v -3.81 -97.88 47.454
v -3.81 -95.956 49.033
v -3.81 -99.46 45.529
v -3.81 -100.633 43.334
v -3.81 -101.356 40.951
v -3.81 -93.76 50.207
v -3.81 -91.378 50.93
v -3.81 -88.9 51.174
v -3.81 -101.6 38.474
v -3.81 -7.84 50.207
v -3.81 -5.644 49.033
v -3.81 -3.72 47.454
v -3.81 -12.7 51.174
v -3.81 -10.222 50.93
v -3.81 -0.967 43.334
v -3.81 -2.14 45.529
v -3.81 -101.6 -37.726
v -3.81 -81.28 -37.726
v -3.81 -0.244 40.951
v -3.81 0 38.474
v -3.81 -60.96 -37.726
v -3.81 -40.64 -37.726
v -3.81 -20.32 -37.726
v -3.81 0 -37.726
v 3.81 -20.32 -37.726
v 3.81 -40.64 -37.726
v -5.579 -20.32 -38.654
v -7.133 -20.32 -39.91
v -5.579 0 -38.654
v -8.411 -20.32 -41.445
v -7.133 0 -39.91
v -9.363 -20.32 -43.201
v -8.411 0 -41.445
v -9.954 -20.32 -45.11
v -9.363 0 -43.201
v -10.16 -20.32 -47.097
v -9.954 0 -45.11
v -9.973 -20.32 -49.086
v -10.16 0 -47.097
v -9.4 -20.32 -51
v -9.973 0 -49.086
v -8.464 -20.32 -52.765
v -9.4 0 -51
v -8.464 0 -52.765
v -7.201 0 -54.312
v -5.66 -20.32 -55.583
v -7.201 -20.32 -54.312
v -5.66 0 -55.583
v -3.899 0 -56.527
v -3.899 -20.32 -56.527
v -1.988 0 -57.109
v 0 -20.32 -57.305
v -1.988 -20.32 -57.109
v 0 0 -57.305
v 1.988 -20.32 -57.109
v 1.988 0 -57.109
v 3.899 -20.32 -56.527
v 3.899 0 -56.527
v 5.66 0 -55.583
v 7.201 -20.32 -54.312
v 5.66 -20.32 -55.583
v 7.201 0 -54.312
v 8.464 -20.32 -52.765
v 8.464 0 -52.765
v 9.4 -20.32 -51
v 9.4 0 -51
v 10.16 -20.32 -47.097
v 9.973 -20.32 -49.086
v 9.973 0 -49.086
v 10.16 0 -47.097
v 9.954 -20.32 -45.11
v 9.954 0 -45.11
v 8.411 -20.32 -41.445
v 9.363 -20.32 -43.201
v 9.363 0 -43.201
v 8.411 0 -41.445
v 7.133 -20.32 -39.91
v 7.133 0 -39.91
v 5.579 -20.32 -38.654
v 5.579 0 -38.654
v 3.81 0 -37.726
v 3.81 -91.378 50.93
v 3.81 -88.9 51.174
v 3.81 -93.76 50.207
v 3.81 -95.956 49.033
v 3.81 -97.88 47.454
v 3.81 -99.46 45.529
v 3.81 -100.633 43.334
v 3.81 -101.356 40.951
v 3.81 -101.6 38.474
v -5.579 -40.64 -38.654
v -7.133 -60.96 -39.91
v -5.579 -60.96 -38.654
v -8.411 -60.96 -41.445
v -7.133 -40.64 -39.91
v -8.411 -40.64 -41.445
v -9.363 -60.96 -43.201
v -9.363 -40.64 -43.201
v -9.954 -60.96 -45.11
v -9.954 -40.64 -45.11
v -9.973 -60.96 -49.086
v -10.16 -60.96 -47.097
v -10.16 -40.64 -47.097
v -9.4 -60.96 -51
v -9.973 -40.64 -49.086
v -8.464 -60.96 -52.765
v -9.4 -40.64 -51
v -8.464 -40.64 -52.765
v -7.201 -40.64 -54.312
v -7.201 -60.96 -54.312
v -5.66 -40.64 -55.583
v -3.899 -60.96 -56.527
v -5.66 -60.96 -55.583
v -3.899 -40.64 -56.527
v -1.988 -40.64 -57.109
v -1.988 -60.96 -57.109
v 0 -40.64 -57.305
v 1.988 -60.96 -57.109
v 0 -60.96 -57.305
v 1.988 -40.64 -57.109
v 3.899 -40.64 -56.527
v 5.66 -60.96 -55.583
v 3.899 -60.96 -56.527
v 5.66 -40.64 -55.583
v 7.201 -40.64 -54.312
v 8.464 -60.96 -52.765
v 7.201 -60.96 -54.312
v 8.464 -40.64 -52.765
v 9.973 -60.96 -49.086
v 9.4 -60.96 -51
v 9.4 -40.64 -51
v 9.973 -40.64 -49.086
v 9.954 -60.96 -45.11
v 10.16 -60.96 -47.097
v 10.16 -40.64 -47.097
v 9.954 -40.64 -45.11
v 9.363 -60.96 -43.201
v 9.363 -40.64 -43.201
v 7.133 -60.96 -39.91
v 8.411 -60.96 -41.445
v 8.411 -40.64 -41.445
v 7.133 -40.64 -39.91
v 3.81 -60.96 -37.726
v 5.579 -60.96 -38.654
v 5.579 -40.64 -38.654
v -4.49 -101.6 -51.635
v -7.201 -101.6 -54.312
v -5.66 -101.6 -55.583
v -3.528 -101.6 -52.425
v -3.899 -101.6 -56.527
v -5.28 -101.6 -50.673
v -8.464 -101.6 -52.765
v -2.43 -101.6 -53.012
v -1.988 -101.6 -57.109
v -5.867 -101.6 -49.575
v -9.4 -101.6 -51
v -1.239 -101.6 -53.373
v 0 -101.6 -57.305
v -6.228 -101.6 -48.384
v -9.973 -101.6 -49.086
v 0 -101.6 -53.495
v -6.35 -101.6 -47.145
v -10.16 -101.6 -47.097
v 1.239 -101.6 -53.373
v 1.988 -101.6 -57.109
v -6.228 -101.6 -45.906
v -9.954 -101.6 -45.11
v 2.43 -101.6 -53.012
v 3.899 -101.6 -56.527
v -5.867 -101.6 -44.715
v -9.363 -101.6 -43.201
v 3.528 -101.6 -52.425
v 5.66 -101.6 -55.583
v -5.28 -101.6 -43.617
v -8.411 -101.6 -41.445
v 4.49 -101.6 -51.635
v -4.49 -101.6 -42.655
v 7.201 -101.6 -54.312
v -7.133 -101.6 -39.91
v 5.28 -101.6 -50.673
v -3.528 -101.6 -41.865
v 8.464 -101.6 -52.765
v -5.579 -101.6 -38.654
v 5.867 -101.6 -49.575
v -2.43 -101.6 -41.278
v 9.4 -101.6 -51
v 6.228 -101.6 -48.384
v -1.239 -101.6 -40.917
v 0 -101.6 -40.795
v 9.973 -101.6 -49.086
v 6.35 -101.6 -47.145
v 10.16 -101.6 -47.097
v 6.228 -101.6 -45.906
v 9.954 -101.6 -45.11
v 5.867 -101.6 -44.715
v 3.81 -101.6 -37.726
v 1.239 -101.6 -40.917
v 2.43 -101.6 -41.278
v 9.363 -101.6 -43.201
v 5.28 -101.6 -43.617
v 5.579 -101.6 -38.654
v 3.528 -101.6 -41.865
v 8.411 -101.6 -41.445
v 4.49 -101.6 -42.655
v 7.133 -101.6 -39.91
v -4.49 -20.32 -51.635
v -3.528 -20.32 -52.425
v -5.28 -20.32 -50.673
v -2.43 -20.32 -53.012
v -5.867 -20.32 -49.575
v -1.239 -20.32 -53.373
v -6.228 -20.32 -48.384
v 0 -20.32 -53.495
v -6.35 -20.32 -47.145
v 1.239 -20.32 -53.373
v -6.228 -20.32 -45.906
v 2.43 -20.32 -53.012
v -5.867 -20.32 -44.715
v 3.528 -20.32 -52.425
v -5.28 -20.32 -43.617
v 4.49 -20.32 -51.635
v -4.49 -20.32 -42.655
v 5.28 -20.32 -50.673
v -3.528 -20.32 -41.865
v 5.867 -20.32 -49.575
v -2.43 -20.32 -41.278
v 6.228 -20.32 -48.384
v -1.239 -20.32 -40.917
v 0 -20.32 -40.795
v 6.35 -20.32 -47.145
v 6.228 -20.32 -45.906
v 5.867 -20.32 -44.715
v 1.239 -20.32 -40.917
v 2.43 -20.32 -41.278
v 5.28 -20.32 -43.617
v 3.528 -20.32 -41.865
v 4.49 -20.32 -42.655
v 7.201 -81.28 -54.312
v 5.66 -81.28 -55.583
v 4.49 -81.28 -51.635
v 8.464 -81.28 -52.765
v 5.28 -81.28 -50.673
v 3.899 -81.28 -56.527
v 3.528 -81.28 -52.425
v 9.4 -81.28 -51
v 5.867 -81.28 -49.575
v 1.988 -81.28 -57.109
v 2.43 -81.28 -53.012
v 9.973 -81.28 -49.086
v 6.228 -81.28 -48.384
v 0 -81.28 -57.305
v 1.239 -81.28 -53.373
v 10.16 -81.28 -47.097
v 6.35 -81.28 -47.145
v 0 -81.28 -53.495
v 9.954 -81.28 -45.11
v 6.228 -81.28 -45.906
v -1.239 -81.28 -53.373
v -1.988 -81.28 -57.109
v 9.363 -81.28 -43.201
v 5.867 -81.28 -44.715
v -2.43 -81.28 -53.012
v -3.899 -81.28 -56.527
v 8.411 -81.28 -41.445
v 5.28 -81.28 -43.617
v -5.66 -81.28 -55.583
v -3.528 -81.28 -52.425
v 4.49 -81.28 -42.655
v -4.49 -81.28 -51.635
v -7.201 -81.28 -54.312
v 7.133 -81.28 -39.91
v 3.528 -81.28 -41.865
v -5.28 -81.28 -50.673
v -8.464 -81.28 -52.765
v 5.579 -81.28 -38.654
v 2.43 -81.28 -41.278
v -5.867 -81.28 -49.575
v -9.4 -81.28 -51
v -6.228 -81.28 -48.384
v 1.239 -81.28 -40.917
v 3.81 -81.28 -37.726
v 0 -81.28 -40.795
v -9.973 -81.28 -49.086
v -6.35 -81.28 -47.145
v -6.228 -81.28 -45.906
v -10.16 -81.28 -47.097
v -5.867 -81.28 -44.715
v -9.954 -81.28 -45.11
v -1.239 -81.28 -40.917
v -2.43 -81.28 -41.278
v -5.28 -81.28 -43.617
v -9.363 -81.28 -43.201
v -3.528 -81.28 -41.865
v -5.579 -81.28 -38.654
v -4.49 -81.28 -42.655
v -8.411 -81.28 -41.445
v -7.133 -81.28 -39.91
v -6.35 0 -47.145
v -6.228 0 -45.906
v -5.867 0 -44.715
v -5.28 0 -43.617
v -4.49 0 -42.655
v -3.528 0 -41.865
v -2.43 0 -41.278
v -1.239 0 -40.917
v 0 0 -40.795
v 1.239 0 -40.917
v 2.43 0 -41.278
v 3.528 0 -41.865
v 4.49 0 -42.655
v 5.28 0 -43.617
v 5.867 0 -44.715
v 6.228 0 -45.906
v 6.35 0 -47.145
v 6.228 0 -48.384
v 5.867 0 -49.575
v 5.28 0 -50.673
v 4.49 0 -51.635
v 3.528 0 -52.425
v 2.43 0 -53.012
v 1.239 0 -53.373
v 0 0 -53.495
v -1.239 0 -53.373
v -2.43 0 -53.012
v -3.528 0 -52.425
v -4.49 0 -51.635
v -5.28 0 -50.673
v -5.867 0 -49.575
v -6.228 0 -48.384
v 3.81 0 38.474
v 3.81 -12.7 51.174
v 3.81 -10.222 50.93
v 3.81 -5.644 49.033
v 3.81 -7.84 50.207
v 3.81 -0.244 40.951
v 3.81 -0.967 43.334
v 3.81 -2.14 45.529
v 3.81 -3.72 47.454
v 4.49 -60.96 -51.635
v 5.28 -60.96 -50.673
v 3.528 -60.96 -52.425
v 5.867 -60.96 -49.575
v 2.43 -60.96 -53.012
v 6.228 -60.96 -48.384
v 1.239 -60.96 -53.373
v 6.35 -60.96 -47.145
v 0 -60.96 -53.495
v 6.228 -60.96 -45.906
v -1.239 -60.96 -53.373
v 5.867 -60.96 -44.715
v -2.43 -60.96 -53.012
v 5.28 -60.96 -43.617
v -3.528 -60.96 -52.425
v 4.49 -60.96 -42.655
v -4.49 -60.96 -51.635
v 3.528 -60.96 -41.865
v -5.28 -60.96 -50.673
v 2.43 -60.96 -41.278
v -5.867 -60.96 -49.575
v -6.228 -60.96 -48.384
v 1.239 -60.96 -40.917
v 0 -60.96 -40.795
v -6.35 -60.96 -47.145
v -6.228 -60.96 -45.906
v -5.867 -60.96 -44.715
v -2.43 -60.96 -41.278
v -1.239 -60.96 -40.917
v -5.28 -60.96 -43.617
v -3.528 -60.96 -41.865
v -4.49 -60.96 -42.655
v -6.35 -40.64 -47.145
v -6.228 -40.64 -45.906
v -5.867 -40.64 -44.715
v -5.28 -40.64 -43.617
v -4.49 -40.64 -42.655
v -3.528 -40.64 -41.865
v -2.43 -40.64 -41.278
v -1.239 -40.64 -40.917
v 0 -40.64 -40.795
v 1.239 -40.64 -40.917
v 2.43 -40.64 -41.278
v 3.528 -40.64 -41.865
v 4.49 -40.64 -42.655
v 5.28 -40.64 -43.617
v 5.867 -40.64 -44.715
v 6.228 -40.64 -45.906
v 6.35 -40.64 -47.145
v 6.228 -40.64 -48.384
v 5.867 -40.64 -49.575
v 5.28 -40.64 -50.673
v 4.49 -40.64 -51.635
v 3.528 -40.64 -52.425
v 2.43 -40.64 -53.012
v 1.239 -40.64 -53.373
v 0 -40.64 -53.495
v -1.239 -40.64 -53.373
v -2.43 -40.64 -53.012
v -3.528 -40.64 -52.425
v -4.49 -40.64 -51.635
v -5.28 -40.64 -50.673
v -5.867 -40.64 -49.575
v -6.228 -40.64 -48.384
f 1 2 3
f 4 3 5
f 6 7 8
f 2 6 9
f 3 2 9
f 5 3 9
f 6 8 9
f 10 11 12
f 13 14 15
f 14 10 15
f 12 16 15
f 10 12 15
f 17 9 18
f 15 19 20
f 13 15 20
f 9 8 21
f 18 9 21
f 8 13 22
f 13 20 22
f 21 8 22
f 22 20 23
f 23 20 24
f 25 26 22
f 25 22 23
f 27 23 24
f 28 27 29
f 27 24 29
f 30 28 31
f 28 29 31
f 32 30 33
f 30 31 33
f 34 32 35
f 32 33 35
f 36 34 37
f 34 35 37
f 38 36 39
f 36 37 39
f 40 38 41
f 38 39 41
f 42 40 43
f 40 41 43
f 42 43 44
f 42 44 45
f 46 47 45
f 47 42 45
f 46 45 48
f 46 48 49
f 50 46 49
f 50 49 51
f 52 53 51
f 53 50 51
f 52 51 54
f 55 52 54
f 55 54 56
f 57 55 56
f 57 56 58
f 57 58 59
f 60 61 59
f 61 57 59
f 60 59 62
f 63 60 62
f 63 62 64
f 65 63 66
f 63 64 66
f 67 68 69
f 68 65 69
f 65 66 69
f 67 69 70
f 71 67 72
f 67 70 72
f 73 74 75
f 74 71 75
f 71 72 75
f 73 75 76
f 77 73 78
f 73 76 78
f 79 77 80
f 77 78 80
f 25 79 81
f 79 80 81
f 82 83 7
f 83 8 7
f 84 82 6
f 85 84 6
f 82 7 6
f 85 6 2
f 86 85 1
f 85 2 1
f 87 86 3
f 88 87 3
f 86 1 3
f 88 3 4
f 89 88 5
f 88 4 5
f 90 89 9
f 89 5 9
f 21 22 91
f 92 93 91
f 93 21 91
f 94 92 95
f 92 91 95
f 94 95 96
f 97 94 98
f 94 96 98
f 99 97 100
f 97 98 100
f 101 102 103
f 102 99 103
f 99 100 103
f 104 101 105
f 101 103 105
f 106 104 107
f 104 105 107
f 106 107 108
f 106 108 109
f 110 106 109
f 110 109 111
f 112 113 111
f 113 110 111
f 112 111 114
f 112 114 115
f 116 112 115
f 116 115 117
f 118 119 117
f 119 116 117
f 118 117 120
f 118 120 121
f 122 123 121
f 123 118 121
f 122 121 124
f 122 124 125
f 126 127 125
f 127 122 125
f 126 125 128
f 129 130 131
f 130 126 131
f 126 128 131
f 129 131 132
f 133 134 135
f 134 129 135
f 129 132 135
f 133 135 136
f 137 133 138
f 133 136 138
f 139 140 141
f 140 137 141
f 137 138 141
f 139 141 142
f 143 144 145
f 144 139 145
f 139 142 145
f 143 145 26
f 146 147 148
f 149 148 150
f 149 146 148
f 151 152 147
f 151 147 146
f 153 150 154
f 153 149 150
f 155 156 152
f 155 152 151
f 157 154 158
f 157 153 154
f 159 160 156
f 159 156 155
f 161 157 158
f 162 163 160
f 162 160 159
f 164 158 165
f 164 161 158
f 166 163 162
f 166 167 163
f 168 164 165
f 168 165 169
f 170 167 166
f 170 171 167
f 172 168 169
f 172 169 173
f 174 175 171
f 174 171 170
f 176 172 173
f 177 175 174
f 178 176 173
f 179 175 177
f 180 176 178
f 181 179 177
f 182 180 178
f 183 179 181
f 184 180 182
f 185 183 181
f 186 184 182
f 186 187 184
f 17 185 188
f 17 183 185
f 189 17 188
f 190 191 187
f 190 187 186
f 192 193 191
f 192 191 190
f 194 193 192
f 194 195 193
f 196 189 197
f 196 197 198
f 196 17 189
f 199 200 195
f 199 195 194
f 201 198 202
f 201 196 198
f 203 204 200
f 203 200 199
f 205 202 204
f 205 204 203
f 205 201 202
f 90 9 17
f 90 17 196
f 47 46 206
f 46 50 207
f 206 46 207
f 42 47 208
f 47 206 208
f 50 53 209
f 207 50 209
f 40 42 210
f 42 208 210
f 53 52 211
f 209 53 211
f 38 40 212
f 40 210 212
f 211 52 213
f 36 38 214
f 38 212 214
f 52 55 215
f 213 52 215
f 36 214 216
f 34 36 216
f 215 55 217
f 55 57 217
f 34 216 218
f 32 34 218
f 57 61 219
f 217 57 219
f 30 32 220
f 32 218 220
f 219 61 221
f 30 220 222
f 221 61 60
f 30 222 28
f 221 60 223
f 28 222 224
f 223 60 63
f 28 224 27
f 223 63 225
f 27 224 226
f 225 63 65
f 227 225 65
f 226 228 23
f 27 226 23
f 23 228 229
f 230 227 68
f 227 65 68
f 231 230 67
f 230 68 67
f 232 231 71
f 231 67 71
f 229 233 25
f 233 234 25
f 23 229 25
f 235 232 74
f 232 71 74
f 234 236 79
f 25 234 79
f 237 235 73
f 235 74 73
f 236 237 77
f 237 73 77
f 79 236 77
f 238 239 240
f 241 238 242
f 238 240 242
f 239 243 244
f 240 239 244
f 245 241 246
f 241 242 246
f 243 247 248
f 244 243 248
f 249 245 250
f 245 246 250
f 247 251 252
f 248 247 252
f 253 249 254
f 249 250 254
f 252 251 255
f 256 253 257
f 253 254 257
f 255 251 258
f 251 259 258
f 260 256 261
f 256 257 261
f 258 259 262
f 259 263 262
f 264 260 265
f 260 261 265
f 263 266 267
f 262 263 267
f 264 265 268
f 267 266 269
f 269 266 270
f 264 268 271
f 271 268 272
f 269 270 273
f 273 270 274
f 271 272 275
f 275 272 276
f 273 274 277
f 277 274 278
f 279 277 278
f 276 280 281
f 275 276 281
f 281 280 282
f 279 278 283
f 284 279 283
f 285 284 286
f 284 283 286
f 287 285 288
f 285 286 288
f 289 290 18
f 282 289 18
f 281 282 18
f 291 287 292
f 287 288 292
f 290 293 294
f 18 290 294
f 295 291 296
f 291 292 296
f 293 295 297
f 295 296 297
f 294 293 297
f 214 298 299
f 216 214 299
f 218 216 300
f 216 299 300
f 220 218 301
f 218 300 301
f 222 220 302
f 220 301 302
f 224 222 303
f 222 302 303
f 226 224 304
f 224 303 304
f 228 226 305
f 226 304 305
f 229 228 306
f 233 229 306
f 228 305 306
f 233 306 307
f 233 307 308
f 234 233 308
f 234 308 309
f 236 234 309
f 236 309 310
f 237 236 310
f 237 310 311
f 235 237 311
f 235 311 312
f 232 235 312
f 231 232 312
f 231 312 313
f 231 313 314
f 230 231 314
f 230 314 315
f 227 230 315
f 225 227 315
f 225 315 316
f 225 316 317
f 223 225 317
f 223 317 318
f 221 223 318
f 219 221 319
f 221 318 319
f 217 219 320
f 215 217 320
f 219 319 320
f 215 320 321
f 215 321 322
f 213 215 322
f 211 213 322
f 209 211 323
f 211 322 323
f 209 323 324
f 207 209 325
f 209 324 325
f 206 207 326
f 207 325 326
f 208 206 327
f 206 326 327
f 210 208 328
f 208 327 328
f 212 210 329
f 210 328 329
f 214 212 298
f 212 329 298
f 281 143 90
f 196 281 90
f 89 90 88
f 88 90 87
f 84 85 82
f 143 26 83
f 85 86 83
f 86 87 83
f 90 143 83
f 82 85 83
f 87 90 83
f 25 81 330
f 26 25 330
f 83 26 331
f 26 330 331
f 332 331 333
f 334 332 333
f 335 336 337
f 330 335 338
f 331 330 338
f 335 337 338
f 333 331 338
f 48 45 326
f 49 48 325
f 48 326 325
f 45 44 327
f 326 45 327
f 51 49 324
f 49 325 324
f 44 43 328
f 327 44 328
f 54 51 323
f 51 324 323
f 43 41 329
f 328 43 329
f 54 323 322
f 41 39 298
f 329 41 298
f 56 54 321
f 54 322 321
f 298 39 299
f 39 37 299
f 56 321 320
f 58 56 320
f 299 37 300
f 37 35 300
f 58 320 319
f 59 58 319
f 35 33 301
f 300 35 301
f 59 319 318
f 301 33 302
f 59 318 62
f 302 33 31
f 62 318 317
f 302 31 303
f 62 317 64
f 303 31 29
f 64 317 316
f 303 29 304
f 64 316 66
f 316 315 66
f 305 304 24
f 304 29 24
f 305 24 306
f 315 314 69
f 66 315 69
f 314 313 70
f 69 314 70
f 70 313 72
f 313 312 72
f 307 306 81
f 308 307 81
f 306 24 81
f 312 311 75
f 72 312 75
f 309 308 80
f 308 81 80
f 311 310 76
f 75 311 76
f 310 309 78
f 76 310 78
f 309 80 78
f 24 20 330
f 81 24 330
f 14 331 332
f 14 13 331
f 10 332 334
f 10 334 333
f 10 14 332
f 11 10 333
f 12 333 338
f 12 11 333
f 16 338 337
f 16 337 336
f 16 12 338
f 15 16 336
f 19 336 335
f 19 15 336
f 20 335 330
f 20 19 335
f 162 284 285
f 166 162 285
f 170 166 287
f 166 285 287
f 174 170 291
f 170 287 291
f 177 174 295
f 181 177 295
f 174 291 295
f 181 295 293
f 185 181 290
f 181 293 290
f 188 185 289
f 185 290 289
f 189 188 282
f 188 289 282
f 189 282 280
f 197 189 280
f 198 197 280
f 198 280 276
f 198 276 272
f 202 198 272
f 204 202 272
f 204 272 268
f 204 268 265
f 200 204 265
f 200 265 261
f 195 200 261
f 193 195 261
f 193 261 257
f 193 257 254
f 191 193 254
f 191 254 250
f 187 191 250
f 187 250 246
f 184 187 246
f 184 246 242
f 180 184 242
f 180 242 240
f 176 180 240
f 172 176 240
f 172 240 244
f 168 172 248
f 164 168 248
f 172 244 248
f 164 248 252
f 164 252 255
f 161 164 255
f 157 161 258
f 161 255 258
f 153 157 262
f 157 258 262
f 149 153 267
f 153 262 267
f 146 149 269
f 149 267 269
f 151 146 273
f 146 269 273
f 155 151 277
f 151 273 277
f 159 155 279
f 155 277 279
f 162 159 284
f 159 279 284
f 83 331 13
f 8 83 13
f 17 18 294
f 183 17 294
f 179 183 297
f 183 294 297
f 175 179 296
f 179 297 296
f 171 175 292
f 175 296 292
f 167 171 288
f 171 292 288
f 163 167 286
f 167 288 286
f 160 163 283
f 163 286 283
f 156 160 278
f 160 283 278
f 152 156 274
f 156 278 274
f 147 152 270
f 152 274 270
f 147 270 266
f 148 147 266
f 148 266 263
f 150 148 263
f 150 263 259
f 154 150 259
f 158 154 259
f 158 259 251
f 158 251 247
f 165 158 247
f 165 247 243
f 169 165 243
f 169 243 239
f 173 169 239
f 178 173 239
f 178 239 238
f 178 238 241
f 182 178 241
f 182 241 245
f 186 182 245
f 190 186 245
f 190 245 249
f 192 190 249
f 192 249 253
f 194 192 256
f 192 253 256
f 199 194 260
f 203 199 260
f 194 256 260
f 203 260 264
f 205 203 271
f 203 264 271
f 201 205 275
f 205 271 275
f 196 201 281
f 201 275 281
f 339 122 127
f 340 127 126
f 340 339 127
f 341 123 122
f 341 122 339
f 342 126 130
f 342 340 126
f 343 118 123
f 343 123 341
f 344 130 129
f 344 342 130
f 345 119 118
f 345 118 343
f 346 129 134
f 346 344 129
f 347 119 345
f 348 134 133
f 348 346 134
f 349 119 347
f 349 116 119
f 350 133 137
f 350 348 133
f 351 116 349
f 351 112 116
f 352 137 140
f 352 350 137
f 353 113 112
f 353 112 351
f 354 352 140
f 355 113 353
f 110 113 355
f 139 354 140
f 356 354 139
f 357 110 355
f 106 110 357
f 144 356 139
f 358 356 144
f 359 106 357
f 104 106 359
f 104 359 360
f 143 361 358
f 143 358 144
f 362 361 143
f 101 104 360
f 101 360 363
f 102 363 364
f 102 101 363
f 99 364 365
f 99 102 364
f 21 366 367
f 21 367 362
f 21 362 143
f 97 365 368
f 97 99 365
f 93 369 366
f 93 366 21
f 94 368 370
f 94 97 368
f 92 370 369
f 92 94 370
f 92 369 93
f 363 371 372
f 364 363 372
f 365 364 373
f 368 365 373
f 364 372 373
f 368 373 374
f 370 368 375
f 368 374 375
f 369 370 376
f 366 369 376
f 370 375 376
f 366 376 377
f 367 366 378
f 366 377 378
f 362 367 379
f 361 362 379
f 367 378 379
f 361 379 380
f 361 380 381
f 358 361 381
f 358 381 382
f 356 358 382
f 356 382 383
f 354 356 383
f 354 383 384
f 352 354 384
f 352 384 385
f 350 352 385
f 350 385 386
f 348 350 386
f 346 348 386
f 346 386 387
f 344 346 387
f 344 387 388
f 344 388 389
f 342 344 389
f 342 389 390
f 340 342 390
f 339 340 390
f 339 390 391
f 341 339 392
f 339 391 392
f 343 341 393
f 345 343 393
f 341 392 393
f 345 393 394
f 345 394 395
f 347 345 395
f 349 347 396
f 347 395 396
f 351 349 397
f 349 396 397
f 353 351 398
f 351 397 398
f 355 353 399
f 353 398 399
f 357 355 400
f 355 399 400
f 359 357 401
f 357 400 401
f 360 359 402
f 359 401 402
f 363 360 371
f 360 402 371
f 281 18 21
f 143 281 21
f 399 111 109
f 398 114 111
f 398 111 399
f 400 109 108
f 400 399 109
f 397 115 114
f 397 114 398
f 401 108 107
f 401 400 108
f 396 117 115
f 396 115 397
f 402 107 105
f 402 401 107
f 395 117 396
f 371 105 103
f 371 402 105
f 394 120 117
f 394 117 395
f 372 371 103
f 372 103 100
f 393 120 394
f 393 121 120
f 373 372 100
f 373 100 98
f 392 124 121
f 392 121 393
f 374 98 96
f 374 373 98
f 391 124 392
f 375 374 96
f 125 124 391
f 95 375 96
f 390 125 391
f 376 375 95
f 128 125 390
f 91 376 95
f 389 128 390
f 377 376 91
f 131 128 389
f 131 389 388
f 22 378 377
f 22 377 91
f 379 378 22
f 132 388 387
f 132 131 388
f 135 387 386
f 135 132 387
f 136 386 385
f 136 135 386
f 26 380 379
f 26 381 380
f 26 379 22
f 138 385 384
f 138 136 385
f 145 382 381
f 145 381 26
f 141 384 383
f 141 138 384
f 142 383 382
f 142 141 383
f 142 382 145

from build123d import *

# Parameters (mm, degrees)
F1_DEPTH = 101.6
F2_R     = 12.7
F3_R     = 6.35
F4_DEPTH = 101.601
F5_W     = 20.32
F5_H     = 24.3607418369
F5_H_2   = 23.7557509671
F6_DEPTH = 50.8


with BuildPart() as f1:
    # F0 (on Front) → F1 (new body)
    with BuildSketch(Plane.XZ):
        with BuildLine():
            Line((3.81, 51.1735859583), (-3.81, 51.1735859583))
            Line((-3.81, 51.1735859583), (-3.81, -37.7264140417))
            ThreePointArc((-3.81, -37.7264140417), (0, -57.3049861203), (3.81, -37.7264140417))
            Line((3.81, -37.7264140417), (3.81, 51.1735859583))
        make_face()
    extrude(amount=F1_DEPTH)

    # F2
    f2_edges = [f1.edges().sort_by_distance(p)[0] for p in [
        (0, -101.6, 51.173586),
        (0, 0, 51.173586),
    ]]
    fillet(f2_edges, radius=F2_R)

    # F3 (on face) → F4 (cut, through all)
    with BuildSketch(Plane(origin=(0, 0, 0), x_dir=(-1, 0, 0), z_dir=(0, 1, 0))):
        with Locations((0, -47.1449861203)):
            Circle(F3_R)
    extrude(amount=-F4_DEPTH, mode=Mode.SUBTRACT)

    # F5 (on face) → F6 (cut, symmetric)
    with BuildSketch(Plane.YZ.offset(3.81)):
        with Locations((-71.12, -49.9067849601)):
            Rectangle(F5_W, F5_H)
        with Locations((-30.48, -49.6042895252)):
            Rectangle(F5_W, F5_H_2)
    extrude(amount=F6_DEPTH, both=True, mode=Mode.SUBTRACT)


solid = f1.part
